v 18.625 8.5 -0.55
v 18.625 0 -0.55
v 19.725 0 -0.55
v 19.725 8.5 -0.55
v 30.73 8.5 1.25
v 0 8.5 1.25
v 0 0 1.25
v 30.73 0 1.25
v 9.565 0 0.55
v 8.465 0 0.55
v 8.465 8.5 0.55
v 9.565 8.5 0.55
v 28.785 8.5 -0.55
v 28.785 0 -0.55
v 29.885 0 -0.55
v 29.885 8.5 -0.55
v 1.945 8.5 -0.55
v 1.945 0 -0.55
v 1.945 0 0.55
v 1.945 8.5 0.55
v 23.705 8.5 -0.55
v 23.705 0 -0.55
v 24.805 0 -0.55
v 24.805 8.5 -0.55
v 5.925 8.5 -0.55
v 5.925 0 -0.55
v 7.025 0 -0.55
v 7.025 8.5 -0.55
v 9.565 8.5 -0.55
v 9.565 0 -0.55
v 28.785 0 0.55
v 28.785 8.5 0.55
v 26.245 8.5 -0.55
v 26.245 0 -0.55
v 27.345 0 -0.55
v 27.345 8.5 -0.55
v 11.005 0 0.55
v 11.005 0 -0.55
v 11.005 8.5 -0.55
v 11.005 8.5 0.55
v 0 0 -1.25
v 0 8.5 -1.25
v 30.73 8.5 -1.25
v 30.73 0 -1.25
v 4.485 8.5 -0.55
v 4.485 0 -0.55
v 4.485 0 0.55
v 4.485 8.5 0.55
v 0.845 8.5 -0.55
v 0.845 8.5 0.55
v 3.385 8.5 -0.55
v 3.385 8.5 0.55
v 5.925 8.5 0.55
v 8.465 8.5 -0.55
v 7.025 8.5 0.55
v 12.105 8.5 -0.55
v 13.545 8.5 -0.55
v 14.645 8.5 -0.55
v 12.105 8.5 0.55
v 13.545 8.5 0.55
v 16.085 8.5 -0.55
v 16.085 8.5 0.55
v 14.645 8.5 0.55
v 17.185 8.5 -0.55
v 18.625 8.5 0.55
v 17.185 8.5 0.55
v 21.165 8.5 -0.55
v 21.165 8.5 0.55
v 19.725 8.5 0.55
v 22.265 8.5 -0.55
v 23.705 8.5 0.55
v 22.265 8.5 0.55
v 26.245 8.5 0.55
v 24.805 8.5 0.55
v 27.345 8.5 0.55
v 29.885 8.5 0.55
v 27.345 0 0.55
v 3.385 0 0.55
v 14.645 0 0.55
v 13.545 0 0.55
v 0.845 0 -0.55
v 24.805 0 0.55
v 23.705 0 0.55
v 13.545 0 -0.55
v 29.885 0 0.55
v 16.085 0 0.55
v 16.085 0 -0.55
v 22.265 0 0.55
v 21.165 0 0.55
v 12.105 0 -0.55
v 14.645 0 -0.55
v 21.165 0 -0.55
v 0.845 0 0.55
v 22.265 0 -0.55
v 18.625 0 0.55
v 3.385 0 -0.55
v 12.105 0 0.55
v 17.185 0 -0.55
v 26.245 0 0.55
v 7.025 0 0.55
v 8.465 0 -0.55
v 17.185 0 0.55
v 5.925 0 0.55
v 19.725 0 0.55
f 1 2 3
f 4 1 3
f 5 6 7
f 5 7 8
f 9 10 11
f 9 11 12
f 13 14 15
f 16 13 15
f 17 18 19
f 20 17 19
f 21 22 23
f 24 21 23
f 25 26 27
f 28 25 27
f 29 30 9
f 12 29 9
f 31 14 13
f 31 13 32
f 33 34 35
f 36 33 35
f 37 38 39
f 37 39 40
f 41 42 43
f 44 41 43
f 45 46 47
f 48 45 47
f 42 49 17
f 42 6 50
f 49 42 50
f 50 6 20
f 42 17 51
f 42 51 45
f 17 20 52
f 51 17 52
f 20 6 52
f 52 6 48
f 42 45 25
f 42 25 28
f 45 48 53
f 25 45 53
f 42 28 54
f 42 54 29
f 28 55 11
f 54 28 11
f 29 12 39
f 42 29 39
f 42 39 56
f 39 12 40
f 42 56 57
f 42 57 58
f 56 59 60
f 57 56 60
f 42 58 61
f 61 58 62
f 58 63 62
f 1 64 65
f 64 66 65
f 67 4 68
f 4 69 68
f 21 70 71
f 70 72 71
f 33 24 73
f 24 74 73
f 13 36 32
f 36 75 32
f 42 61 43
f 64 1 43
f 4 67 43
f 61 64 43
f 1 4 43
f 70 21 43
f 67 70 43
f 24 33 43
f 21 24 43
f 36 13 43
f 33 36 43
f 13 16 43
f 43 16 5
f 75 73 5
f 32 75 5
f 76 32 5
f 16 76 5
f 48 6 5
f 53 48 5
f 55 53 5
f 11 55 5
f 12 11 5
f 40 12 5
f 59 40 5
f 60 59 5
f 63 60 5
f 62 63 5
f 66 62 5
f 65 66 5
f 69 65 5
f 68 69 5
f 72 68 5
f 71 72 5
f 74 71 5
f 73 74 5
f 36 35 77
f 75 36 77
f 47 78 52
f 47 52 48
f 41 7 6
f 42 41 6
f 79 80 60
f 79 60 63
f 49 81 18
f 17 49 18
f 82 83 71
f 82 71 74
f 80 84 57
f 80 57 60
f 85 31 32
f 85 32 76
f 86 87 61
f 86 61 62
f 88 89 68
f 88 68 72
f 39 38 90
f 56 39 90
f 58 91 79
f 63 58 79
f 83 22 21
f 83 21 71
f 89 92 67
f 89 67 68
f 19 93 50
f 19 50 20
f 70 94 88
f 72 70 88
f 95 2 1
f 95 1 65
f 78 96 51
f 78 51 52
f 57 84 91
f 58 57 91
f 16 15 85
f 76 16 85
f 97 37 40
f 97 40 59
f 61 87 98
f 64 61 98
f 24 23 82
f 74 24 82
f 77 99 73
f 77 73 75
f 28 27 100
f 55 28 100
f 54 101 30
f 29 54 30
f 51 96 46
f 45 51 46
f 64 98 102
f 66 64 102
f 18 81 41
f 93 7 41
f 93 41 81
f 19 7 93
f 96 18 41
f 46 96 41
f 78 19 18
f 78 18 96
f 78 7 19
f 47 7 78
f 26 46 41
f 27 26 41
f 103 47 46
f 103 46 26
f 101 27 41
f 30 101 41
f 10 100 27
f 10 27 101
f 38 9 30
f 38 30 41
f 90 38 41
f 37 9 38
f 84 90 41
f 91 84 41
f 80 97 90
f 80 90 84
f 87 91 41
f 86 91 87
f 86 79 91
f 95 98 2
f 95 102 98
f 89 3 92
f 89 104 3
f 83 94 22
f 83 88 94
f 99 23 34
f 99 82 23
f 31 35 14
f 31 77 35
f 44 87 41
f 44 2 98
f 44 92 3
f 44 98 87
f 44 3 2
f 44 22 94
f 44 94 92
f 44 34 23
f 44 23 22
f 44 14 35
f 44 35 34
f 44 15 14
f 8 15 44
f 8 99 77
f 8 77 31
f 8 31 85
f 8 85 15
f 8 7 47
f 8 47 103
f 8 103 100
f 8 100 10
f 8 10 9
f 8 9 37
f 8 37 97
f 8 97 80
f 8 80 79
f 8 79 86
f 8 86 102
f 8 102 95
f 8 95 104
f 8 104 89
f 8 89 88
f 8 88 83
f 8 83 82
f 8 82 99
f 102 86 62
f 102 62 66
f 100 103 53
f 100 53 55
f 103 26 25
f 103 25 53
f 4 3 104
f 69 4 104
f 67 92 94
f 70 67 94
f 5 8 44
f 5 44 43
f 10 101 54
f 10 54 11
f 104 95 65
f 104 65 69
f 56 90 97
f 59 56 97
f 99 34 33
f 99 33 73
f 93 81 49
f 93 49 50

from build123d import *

# Parameters (mm, degrees)
SKETCH1_W           = 30.73
SKETCH1_H           = 8.5
BOSS_EXTRUDE1_DEPTH = 1.25
SKETCH2_W           = 1.1
SKETCH2_H           = 1.1
CUT_EXTRUDE1_DEPTH  = 32.908390746


with BuildPart() as part:
    # Sketch1 → Boss-Extrude1 (new, symmetric)
    with BuildSketch(Plane.XY):
        with Locations((15.365, 4.25)):
            Rectangle(SKETCH1_W, SKETCH1_H)
    extrude(amount=BOSS_EXTRUDE1_DEPTH, both=True)

    # Sketch2 → Cut-Extrude1 (cut, through all)
    with BuildSketch(Plane.XZ):
        with Locations((3.935, 0)):
            Rectangle(SKETCH2_W, SKETCH2_H)
        with Locations((1.395, 0)):
            Rectangle(SKETCH2_W, SKETCH2_H)
        with Locations((6.475, 0)):
            Rectangle(SKETCH2_W, SKETCH2_H)
        with Locations((9.015, 0)):
            Rectangle(SKETCH2_W, SKETCH2_H)
        with Locations((11.555, 0)):
            Rectangle(SKETCH2_W, SKETCH2_H)
        with Locations((14.095, 0)):
            Rectangle(SKETCH2_W, SKETCH2_H)
        with Locations((16.635, 0)):
            Rectangle(SKETCH2_W, SKETCH2_H)
        with Locations((19.175, 0)):
            Rectangle(SKETCH2_W, SKETCH2_H)
        with Locations((21.715, 0)):
            Rectangle(SKETCH2_W, SKETCH2_H)
        with Locations((24.255, 0)):
            Rectangle(SKETCH2_W, SKETCH2_H)
        with Locations((26.795, 0)):
            Rectangle(SKETCH2_W, SKETCH2_H)
        with Locations((29.335, 0)):
            Rectangle(SKETCH2_W, SKETCH2_H)
    extrude(amount=-CUT_EXTRUDE1_DEPTH, mode=Mode.SUBTRACT)


solid = part.part
